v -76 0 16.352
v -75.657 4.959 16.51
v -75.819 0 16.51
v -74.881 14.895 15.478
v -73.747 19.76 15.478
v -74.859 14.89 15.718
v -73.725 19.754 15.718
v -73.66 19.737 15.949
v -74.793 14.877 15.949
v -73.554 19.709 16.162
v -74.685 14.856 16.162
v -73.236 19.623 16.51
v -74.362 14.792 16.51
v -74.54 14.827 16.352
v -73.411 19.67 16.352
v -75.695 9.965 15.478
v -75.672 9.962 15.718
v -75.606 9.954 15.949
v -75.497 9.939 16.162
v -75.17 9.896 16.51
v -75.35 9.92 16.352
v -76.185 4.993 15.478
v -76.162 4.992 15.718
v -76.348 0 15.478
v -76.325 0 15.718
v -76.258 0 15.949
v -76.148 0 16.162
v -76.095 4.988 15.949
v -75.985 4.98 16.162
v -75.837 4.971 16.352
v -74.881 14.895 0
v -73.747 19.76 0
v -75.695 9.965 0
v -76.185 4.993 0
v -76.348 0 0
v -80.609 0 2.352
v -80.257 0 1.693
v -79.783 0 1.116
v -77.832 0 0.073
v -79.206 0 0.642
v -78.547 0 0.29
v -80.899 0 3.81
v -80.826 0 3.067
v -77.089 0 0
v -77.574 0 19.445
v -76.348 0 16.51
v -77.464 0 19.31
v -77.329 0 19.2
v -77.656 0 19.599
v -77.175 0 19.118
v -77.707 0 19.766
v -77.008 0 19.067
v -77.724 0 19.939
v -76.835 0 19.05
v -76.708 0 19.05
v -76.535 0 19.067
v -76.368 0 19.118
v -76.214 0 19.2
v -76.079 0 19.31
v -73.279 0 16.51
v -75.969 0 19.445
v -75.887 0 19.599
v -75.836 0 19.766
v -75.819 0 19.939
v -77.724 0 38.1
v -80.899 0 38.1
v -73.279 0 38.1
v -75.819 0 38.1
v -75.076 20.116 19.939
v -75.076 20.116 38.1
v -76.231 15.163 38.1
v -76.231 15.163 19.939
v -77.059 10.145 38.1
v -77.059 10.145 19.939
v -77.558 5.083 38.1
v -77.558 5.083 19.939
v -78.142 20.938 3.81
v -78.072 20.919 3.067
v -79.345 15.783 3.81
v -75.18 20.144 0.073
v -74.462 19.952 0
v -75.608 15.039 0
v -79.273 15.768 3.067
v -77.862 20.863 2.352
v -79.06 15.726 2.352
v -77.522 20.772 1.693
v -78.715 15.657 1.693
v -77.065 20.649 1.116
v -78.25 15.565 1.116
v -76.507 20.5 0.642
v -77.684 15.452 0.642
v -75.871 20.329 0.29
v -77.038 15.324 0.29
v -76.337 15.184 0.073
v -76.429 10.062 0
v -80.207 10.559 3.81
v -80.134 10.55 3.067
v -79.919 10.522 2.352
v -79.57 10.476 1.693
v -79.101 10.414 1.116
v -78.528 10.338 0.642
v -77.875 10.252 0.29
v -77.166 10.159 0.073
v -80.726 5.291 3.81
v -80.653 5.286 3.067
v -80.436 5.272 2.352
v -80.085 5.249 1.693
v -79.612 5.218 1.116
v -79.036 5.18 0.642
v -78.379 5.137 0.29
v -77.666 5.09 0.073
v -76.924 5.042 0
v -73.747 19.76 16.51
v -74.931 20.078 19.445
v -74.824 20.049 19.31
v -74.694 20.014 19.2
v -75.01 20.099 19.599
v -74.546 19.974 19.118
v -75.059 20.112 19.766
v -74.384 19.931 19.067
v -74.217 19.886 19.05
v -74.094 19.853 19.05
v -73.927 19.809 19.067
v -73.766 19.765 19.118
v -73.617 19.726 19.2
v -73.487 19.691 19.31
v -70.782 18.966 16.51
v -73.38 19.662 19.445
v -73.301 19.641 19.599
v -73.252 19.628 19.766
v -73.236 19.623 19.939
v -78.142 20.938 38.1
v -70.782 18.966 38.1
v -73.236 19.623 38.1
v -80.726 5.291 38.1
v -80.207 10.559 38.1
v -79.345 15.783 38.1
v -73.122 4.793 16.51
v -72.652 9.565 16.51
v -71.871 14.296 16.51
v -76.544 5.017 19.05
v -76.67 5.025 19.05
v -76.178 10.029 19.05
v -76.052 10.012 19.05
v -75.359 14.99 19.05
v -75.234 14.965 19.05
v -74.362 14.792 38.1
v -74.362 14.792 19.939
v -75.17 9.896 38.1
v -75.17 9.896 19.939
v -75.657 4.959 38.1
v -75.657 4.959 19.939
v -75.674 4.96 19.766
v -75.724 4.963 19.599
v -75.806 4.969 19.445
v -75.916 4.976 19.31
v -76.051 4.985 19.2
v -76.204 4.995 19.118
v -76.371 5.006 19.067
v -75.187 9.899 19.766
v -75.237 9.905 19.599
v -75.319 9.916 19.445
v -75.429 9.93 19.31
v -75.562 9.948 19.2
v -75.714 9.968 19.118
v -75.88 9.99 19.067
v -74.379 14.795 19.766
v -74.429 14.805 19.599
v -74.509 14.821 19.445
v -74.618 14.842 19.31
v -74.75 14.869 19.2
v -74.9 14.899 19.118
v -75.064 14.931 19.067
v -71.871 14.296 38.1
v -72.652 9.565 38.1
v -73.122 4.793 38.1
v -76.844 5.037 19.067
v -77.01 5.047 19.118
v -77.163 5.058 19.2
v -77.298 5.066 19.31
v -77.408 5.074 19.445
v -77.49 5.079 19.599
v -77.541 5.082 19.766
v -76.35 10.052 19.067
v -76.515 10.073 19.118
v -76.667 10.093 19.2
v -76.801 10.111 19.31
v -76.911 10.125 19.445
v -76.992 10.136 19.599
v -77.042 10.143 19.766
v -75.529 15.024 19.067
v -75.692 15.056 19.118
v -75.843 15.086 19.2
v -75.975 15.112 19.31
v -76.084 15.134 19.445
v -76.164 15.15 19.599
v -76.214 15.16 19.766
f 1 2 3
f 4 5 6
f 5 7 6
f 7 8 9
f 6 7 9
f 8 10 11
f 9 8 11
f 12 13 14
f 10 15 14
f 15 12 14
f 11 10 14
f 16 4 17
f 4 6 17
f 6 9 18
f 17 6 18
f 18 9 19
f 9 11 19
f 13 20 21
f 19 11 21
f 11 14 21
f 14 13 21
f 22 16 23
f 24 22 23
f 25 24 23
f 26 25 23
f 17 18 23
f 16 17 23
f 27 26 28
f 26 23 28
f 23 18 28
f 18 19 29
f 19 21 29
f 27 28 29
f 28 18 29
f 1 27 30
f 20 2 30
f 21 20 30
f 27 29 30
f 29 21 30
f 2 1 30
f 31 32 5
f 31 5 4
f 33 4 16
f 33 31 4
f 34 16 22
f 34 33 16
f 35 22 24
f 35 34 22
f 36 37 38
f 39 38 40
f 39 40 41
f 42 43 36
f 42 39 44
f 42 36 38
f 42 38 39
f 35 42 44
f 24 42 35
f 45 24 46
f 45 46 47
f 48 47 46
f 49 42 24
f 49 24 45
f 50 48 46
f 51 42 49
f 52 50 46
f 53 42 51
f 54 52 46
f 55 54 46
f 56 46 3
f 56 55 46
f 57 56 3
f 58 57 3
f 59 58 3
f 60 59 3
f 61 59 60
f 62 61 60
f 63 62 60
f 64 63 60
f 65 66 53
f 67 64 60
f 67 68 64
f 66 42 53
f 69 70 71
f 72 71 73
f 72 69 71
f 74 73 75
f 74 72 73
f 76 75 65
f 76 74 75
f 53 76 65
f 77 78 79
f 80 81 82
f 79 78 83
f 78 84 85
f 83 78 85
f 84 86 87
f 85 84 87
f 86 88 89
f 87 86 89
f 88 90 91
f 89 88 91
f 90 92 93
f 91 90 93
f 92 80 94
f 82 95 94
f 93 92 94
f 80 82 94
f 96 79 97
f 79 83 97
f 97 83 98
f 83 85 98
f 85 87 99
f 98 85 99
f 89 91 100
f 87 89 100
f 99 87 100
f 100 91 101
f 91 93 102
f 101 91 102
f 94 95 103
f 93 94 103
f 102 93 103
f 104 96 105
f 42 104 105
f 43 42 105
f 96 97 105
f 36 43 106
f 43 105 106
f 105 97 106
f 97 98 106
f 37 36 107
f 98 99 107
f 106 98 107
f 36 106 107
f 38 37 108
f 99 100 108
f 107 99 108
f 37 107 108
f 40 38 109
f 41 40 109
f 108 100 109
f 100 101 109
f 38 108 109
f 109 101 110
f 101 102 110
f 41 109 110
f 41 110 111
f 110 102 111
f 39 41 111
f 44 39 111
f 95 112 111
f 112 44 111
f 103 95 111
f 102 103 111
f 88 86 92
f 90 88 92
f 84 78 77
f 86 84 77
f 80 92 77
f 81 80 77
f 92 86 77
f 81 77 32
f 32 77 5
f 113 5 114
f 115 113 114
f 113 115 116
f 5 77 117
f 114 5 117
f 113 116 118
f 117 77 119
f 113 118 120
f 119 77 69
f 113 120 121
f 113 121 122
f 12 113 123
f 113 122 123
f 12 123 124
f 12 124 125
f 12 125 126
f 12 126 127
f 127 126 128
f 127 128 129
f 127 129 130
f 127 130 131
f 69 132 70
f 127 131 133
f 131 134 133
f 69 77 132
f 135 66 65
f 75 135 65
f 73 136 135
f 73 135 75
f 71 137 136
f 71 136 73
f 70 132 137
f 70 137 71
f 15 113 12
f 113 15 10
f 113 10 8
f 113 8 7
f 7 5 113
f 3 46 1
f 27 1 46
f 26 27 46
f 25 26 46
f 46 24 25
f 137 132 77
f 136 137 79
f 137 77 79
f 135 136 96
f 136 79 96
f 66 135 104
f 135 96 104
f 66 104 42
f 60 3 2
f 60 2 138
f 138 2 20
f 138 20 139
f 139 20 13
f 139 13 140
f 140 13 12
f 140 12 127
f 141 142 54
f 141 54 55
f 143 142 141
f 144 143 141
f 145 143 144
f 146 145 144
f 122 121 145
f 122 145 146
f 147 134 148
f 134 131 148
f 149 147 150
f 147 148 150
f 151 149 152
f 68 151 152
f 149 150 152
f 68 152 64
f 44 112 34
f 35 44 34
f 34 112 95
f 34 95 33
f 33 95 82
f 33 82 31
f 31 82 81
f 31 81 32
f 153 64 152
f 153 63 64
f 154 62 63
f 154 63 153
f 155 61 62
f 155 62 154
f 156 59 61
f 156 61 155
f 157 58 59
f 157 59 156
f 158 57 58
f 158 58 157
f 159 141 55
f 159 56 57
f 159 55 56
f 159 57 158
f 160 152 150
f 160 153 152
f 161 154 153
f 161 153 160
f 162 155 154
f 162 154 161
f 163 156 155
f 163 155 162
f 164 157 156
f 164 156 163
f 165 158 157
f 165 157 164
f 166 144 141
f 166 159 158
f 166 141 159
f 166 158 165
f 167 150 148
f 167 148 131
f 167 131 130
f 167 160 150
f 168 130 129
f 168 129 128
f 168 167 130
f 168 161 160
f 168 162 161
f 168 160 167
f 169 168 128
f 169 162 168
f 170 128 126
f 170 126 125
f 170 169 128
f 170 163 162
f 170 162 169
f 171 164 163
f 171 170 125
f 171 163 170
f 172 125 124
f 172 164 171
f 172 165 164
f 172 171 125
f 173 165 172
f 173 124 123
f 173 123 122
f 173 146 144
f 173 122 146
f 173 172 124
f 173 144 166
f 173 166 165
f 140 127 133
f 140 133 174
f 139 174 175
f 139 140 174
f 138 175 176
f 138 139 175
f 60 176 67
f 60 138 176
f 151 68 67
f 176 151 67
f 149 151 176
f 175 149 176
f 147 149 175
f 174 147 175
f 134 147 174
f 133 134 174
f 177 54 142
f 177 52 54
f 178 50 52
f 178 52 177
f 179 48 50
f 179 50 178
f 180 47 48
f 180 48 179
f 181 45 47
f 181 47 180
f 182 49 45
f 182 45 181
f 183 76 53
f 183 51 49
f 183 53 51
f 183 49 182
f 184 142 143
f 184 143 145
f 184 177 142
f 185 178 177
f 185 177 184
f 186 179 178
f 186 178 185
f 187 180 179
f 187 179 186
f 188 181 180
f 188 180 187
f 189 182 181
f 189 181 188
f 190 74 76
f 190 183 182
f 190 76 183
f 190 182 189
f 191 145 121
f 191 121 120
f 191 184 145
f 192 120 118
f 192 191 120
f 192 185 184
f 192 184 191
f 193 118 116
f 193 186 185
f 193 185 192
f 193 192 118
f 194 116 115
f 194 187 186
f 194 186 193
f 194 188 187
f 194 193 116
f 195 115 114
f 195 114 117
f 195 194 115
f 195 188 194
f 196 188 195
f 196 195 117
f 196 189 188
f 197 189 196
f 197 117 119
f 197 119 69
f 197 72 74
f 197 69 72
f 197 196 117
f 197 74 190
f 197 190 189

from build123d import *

# Parameters (mm, degrees)
F0_R        = 80.899
F0_R_2      = 77.724
F1_DEPTH    = 38.1
F0_R_3      = 75.819
F0_R_4      = 73.279
F2_DEPTH    = 19.05
F3_W        = 22.7063447237
F3_H        = 49.682635814
F4_ANGLE    = 15
F5_R        = 76.3482321919
F6_DEPTH    = 16.51
F7_T2_ANGLE = 15
F9_ANGLE    = 15
F10_R       = 3.81


# Not quite as in the source:
# - a fillet or chamfer that OpenCascade refuses, or shapes differently, is made with other operations: its cross-section is extruded or revolved along the edge and cut away or added


with BuildPart() as f1:
    # F0 (on Top) → F1 (new body)
    with BuildSketch(Plane.XY):
        Circle(F0_R)
        Circle(F0_R_2, mode=Mode.SUBTRACT)
    extrude(amount=F1_DEPTH)


with BuildPart() as f1b:
    # F0 (on Top) → F1, piece 2 (new body)
    with BuildSketch(Plane.XY):
        Circle(F0_R_3)
        Circle(F0_R_4, mode=Mode.SUBTRACT)
    extrude(amount=F1_DEPTH)


with BuildPart() as f2:
    # F0 (on Top) → F2 (new body)
    with BuildSketch(Plane.XY):
        Circle(F0_R_2)
        Circle(F0_R_3, mode=Mode.SUBTRACT)
    extrude(amount=F2_DEPTH)


with BuildPart() as f4_tool:
    # F3 (on Front) → F4 (revolve)
    with BuildSketch(Plane.XZ):
        with Locations((-76.5442997217, 24.841317907)):
            Rectangle(F3_W, F3_H)
    revolve(axis=Axis((0, 0, 38.7800522149), (0, 0, -1)), revolution_arc=F4_ANGLE)


with BuildPart() as f1_1:
    add(f1.part)

    # F4: intersect by f4_tool
    add(f4_tool.part, mode=Mode.INTERSECT)



with BuildPart() as f1b_1:
    add(f1b.part)

    # F4: intersect by f4_tool
    add(f4_tool.part, mode=Mode.INTERSECT)


with BuildPart() as f2_1:
    add(f2.part)

    # F4: intersect by f4_tool
    add(f4_tool.part, mode=Mode.INTERSECT)


with BuildPart() as f6_tool:
    # F5 (on Top) → F6 (new body)
    with BuildSketch(Plane.XY):
        Circle(F5_R)
    extrude(amount=F6_DEPTH)


with BuildPart() as f1b_2:
    add(f1b_1.part)

    # F6: cut by f6_tool
    add(f6_tool.part, mode=Mode.SUBTRACT)


with BuildPart() as f2_2:
    add(f2_1.part)

    # F6: cut by f6_tool
    add(f6_tool.part, mode=Mode.SUBTRACT)

    # F7: fillet of radius 1.27 on 1 edges, made by hand

    # F7_s1 → F7_t2 (revolve)
    with BuildSketch(Plane(origin=(0, 0, 0), x_dir=(0, 0, 1), z_dir=(0.2588190451, 0.9659258263, 0))):
        with BuildLine():
            ThreePointArc((15.4784172091, -76.3482321919), (16.0581261377, -76.2082045624), (16.51, -75.819))
            Line((16.51, -75.819), (16.51, -76.3482321919))
            Line((16.51, -76.3482321919), (15.4784172091, -76.3482321919))
        make_face()
    revolve(axis=Axis((0, 0, 16.51), (0, 0, 1)), revolution_arc=F7_T2_ANGLE)


with BuildPart() as f1_2:
    add(f1_1.part)

    add(f1b_2.part)  # F9 merges F1b

    add(f2_2.part)  # F9 merges F2
    # F8 (on Front) → F9 (revolve)
    with BuildSketch(Plane.XZ):
        with BuildLine():
            ThreePointArc((-75.819, 19.939), (-76.0793820715, 19.3103820715), (-76.708, 19.05))
            Line((-76.708, 19.05), (-75.819, 19.05))
            Line((-75.819, 19.05), (-75.819, 19.939))
        make_face()
        with BuildLine():
            ThreePointArc((-76.835, 19.05), (-77.4636179285, 19.3103820715), (-77.724, 19.939))
            Line((-77.724, 19.939), (-77.724, 19.05))
            Line((-77.724, 19.05), (-76.835, 19.05))
        make_face()
    revolve(axis=Axis((0, 0, 38.7800522149), (0, 0, -1)), revolution_arc=F9_ANGLE)

    # F10
    f10_edges = [f1_2.edges().sort_by_distance(p)[0] for p in [
        (-80.206898, 10.559438, 0),
    ]]
    fillet(f10_edges, radius=F10_R)


solid = f1_2.part
